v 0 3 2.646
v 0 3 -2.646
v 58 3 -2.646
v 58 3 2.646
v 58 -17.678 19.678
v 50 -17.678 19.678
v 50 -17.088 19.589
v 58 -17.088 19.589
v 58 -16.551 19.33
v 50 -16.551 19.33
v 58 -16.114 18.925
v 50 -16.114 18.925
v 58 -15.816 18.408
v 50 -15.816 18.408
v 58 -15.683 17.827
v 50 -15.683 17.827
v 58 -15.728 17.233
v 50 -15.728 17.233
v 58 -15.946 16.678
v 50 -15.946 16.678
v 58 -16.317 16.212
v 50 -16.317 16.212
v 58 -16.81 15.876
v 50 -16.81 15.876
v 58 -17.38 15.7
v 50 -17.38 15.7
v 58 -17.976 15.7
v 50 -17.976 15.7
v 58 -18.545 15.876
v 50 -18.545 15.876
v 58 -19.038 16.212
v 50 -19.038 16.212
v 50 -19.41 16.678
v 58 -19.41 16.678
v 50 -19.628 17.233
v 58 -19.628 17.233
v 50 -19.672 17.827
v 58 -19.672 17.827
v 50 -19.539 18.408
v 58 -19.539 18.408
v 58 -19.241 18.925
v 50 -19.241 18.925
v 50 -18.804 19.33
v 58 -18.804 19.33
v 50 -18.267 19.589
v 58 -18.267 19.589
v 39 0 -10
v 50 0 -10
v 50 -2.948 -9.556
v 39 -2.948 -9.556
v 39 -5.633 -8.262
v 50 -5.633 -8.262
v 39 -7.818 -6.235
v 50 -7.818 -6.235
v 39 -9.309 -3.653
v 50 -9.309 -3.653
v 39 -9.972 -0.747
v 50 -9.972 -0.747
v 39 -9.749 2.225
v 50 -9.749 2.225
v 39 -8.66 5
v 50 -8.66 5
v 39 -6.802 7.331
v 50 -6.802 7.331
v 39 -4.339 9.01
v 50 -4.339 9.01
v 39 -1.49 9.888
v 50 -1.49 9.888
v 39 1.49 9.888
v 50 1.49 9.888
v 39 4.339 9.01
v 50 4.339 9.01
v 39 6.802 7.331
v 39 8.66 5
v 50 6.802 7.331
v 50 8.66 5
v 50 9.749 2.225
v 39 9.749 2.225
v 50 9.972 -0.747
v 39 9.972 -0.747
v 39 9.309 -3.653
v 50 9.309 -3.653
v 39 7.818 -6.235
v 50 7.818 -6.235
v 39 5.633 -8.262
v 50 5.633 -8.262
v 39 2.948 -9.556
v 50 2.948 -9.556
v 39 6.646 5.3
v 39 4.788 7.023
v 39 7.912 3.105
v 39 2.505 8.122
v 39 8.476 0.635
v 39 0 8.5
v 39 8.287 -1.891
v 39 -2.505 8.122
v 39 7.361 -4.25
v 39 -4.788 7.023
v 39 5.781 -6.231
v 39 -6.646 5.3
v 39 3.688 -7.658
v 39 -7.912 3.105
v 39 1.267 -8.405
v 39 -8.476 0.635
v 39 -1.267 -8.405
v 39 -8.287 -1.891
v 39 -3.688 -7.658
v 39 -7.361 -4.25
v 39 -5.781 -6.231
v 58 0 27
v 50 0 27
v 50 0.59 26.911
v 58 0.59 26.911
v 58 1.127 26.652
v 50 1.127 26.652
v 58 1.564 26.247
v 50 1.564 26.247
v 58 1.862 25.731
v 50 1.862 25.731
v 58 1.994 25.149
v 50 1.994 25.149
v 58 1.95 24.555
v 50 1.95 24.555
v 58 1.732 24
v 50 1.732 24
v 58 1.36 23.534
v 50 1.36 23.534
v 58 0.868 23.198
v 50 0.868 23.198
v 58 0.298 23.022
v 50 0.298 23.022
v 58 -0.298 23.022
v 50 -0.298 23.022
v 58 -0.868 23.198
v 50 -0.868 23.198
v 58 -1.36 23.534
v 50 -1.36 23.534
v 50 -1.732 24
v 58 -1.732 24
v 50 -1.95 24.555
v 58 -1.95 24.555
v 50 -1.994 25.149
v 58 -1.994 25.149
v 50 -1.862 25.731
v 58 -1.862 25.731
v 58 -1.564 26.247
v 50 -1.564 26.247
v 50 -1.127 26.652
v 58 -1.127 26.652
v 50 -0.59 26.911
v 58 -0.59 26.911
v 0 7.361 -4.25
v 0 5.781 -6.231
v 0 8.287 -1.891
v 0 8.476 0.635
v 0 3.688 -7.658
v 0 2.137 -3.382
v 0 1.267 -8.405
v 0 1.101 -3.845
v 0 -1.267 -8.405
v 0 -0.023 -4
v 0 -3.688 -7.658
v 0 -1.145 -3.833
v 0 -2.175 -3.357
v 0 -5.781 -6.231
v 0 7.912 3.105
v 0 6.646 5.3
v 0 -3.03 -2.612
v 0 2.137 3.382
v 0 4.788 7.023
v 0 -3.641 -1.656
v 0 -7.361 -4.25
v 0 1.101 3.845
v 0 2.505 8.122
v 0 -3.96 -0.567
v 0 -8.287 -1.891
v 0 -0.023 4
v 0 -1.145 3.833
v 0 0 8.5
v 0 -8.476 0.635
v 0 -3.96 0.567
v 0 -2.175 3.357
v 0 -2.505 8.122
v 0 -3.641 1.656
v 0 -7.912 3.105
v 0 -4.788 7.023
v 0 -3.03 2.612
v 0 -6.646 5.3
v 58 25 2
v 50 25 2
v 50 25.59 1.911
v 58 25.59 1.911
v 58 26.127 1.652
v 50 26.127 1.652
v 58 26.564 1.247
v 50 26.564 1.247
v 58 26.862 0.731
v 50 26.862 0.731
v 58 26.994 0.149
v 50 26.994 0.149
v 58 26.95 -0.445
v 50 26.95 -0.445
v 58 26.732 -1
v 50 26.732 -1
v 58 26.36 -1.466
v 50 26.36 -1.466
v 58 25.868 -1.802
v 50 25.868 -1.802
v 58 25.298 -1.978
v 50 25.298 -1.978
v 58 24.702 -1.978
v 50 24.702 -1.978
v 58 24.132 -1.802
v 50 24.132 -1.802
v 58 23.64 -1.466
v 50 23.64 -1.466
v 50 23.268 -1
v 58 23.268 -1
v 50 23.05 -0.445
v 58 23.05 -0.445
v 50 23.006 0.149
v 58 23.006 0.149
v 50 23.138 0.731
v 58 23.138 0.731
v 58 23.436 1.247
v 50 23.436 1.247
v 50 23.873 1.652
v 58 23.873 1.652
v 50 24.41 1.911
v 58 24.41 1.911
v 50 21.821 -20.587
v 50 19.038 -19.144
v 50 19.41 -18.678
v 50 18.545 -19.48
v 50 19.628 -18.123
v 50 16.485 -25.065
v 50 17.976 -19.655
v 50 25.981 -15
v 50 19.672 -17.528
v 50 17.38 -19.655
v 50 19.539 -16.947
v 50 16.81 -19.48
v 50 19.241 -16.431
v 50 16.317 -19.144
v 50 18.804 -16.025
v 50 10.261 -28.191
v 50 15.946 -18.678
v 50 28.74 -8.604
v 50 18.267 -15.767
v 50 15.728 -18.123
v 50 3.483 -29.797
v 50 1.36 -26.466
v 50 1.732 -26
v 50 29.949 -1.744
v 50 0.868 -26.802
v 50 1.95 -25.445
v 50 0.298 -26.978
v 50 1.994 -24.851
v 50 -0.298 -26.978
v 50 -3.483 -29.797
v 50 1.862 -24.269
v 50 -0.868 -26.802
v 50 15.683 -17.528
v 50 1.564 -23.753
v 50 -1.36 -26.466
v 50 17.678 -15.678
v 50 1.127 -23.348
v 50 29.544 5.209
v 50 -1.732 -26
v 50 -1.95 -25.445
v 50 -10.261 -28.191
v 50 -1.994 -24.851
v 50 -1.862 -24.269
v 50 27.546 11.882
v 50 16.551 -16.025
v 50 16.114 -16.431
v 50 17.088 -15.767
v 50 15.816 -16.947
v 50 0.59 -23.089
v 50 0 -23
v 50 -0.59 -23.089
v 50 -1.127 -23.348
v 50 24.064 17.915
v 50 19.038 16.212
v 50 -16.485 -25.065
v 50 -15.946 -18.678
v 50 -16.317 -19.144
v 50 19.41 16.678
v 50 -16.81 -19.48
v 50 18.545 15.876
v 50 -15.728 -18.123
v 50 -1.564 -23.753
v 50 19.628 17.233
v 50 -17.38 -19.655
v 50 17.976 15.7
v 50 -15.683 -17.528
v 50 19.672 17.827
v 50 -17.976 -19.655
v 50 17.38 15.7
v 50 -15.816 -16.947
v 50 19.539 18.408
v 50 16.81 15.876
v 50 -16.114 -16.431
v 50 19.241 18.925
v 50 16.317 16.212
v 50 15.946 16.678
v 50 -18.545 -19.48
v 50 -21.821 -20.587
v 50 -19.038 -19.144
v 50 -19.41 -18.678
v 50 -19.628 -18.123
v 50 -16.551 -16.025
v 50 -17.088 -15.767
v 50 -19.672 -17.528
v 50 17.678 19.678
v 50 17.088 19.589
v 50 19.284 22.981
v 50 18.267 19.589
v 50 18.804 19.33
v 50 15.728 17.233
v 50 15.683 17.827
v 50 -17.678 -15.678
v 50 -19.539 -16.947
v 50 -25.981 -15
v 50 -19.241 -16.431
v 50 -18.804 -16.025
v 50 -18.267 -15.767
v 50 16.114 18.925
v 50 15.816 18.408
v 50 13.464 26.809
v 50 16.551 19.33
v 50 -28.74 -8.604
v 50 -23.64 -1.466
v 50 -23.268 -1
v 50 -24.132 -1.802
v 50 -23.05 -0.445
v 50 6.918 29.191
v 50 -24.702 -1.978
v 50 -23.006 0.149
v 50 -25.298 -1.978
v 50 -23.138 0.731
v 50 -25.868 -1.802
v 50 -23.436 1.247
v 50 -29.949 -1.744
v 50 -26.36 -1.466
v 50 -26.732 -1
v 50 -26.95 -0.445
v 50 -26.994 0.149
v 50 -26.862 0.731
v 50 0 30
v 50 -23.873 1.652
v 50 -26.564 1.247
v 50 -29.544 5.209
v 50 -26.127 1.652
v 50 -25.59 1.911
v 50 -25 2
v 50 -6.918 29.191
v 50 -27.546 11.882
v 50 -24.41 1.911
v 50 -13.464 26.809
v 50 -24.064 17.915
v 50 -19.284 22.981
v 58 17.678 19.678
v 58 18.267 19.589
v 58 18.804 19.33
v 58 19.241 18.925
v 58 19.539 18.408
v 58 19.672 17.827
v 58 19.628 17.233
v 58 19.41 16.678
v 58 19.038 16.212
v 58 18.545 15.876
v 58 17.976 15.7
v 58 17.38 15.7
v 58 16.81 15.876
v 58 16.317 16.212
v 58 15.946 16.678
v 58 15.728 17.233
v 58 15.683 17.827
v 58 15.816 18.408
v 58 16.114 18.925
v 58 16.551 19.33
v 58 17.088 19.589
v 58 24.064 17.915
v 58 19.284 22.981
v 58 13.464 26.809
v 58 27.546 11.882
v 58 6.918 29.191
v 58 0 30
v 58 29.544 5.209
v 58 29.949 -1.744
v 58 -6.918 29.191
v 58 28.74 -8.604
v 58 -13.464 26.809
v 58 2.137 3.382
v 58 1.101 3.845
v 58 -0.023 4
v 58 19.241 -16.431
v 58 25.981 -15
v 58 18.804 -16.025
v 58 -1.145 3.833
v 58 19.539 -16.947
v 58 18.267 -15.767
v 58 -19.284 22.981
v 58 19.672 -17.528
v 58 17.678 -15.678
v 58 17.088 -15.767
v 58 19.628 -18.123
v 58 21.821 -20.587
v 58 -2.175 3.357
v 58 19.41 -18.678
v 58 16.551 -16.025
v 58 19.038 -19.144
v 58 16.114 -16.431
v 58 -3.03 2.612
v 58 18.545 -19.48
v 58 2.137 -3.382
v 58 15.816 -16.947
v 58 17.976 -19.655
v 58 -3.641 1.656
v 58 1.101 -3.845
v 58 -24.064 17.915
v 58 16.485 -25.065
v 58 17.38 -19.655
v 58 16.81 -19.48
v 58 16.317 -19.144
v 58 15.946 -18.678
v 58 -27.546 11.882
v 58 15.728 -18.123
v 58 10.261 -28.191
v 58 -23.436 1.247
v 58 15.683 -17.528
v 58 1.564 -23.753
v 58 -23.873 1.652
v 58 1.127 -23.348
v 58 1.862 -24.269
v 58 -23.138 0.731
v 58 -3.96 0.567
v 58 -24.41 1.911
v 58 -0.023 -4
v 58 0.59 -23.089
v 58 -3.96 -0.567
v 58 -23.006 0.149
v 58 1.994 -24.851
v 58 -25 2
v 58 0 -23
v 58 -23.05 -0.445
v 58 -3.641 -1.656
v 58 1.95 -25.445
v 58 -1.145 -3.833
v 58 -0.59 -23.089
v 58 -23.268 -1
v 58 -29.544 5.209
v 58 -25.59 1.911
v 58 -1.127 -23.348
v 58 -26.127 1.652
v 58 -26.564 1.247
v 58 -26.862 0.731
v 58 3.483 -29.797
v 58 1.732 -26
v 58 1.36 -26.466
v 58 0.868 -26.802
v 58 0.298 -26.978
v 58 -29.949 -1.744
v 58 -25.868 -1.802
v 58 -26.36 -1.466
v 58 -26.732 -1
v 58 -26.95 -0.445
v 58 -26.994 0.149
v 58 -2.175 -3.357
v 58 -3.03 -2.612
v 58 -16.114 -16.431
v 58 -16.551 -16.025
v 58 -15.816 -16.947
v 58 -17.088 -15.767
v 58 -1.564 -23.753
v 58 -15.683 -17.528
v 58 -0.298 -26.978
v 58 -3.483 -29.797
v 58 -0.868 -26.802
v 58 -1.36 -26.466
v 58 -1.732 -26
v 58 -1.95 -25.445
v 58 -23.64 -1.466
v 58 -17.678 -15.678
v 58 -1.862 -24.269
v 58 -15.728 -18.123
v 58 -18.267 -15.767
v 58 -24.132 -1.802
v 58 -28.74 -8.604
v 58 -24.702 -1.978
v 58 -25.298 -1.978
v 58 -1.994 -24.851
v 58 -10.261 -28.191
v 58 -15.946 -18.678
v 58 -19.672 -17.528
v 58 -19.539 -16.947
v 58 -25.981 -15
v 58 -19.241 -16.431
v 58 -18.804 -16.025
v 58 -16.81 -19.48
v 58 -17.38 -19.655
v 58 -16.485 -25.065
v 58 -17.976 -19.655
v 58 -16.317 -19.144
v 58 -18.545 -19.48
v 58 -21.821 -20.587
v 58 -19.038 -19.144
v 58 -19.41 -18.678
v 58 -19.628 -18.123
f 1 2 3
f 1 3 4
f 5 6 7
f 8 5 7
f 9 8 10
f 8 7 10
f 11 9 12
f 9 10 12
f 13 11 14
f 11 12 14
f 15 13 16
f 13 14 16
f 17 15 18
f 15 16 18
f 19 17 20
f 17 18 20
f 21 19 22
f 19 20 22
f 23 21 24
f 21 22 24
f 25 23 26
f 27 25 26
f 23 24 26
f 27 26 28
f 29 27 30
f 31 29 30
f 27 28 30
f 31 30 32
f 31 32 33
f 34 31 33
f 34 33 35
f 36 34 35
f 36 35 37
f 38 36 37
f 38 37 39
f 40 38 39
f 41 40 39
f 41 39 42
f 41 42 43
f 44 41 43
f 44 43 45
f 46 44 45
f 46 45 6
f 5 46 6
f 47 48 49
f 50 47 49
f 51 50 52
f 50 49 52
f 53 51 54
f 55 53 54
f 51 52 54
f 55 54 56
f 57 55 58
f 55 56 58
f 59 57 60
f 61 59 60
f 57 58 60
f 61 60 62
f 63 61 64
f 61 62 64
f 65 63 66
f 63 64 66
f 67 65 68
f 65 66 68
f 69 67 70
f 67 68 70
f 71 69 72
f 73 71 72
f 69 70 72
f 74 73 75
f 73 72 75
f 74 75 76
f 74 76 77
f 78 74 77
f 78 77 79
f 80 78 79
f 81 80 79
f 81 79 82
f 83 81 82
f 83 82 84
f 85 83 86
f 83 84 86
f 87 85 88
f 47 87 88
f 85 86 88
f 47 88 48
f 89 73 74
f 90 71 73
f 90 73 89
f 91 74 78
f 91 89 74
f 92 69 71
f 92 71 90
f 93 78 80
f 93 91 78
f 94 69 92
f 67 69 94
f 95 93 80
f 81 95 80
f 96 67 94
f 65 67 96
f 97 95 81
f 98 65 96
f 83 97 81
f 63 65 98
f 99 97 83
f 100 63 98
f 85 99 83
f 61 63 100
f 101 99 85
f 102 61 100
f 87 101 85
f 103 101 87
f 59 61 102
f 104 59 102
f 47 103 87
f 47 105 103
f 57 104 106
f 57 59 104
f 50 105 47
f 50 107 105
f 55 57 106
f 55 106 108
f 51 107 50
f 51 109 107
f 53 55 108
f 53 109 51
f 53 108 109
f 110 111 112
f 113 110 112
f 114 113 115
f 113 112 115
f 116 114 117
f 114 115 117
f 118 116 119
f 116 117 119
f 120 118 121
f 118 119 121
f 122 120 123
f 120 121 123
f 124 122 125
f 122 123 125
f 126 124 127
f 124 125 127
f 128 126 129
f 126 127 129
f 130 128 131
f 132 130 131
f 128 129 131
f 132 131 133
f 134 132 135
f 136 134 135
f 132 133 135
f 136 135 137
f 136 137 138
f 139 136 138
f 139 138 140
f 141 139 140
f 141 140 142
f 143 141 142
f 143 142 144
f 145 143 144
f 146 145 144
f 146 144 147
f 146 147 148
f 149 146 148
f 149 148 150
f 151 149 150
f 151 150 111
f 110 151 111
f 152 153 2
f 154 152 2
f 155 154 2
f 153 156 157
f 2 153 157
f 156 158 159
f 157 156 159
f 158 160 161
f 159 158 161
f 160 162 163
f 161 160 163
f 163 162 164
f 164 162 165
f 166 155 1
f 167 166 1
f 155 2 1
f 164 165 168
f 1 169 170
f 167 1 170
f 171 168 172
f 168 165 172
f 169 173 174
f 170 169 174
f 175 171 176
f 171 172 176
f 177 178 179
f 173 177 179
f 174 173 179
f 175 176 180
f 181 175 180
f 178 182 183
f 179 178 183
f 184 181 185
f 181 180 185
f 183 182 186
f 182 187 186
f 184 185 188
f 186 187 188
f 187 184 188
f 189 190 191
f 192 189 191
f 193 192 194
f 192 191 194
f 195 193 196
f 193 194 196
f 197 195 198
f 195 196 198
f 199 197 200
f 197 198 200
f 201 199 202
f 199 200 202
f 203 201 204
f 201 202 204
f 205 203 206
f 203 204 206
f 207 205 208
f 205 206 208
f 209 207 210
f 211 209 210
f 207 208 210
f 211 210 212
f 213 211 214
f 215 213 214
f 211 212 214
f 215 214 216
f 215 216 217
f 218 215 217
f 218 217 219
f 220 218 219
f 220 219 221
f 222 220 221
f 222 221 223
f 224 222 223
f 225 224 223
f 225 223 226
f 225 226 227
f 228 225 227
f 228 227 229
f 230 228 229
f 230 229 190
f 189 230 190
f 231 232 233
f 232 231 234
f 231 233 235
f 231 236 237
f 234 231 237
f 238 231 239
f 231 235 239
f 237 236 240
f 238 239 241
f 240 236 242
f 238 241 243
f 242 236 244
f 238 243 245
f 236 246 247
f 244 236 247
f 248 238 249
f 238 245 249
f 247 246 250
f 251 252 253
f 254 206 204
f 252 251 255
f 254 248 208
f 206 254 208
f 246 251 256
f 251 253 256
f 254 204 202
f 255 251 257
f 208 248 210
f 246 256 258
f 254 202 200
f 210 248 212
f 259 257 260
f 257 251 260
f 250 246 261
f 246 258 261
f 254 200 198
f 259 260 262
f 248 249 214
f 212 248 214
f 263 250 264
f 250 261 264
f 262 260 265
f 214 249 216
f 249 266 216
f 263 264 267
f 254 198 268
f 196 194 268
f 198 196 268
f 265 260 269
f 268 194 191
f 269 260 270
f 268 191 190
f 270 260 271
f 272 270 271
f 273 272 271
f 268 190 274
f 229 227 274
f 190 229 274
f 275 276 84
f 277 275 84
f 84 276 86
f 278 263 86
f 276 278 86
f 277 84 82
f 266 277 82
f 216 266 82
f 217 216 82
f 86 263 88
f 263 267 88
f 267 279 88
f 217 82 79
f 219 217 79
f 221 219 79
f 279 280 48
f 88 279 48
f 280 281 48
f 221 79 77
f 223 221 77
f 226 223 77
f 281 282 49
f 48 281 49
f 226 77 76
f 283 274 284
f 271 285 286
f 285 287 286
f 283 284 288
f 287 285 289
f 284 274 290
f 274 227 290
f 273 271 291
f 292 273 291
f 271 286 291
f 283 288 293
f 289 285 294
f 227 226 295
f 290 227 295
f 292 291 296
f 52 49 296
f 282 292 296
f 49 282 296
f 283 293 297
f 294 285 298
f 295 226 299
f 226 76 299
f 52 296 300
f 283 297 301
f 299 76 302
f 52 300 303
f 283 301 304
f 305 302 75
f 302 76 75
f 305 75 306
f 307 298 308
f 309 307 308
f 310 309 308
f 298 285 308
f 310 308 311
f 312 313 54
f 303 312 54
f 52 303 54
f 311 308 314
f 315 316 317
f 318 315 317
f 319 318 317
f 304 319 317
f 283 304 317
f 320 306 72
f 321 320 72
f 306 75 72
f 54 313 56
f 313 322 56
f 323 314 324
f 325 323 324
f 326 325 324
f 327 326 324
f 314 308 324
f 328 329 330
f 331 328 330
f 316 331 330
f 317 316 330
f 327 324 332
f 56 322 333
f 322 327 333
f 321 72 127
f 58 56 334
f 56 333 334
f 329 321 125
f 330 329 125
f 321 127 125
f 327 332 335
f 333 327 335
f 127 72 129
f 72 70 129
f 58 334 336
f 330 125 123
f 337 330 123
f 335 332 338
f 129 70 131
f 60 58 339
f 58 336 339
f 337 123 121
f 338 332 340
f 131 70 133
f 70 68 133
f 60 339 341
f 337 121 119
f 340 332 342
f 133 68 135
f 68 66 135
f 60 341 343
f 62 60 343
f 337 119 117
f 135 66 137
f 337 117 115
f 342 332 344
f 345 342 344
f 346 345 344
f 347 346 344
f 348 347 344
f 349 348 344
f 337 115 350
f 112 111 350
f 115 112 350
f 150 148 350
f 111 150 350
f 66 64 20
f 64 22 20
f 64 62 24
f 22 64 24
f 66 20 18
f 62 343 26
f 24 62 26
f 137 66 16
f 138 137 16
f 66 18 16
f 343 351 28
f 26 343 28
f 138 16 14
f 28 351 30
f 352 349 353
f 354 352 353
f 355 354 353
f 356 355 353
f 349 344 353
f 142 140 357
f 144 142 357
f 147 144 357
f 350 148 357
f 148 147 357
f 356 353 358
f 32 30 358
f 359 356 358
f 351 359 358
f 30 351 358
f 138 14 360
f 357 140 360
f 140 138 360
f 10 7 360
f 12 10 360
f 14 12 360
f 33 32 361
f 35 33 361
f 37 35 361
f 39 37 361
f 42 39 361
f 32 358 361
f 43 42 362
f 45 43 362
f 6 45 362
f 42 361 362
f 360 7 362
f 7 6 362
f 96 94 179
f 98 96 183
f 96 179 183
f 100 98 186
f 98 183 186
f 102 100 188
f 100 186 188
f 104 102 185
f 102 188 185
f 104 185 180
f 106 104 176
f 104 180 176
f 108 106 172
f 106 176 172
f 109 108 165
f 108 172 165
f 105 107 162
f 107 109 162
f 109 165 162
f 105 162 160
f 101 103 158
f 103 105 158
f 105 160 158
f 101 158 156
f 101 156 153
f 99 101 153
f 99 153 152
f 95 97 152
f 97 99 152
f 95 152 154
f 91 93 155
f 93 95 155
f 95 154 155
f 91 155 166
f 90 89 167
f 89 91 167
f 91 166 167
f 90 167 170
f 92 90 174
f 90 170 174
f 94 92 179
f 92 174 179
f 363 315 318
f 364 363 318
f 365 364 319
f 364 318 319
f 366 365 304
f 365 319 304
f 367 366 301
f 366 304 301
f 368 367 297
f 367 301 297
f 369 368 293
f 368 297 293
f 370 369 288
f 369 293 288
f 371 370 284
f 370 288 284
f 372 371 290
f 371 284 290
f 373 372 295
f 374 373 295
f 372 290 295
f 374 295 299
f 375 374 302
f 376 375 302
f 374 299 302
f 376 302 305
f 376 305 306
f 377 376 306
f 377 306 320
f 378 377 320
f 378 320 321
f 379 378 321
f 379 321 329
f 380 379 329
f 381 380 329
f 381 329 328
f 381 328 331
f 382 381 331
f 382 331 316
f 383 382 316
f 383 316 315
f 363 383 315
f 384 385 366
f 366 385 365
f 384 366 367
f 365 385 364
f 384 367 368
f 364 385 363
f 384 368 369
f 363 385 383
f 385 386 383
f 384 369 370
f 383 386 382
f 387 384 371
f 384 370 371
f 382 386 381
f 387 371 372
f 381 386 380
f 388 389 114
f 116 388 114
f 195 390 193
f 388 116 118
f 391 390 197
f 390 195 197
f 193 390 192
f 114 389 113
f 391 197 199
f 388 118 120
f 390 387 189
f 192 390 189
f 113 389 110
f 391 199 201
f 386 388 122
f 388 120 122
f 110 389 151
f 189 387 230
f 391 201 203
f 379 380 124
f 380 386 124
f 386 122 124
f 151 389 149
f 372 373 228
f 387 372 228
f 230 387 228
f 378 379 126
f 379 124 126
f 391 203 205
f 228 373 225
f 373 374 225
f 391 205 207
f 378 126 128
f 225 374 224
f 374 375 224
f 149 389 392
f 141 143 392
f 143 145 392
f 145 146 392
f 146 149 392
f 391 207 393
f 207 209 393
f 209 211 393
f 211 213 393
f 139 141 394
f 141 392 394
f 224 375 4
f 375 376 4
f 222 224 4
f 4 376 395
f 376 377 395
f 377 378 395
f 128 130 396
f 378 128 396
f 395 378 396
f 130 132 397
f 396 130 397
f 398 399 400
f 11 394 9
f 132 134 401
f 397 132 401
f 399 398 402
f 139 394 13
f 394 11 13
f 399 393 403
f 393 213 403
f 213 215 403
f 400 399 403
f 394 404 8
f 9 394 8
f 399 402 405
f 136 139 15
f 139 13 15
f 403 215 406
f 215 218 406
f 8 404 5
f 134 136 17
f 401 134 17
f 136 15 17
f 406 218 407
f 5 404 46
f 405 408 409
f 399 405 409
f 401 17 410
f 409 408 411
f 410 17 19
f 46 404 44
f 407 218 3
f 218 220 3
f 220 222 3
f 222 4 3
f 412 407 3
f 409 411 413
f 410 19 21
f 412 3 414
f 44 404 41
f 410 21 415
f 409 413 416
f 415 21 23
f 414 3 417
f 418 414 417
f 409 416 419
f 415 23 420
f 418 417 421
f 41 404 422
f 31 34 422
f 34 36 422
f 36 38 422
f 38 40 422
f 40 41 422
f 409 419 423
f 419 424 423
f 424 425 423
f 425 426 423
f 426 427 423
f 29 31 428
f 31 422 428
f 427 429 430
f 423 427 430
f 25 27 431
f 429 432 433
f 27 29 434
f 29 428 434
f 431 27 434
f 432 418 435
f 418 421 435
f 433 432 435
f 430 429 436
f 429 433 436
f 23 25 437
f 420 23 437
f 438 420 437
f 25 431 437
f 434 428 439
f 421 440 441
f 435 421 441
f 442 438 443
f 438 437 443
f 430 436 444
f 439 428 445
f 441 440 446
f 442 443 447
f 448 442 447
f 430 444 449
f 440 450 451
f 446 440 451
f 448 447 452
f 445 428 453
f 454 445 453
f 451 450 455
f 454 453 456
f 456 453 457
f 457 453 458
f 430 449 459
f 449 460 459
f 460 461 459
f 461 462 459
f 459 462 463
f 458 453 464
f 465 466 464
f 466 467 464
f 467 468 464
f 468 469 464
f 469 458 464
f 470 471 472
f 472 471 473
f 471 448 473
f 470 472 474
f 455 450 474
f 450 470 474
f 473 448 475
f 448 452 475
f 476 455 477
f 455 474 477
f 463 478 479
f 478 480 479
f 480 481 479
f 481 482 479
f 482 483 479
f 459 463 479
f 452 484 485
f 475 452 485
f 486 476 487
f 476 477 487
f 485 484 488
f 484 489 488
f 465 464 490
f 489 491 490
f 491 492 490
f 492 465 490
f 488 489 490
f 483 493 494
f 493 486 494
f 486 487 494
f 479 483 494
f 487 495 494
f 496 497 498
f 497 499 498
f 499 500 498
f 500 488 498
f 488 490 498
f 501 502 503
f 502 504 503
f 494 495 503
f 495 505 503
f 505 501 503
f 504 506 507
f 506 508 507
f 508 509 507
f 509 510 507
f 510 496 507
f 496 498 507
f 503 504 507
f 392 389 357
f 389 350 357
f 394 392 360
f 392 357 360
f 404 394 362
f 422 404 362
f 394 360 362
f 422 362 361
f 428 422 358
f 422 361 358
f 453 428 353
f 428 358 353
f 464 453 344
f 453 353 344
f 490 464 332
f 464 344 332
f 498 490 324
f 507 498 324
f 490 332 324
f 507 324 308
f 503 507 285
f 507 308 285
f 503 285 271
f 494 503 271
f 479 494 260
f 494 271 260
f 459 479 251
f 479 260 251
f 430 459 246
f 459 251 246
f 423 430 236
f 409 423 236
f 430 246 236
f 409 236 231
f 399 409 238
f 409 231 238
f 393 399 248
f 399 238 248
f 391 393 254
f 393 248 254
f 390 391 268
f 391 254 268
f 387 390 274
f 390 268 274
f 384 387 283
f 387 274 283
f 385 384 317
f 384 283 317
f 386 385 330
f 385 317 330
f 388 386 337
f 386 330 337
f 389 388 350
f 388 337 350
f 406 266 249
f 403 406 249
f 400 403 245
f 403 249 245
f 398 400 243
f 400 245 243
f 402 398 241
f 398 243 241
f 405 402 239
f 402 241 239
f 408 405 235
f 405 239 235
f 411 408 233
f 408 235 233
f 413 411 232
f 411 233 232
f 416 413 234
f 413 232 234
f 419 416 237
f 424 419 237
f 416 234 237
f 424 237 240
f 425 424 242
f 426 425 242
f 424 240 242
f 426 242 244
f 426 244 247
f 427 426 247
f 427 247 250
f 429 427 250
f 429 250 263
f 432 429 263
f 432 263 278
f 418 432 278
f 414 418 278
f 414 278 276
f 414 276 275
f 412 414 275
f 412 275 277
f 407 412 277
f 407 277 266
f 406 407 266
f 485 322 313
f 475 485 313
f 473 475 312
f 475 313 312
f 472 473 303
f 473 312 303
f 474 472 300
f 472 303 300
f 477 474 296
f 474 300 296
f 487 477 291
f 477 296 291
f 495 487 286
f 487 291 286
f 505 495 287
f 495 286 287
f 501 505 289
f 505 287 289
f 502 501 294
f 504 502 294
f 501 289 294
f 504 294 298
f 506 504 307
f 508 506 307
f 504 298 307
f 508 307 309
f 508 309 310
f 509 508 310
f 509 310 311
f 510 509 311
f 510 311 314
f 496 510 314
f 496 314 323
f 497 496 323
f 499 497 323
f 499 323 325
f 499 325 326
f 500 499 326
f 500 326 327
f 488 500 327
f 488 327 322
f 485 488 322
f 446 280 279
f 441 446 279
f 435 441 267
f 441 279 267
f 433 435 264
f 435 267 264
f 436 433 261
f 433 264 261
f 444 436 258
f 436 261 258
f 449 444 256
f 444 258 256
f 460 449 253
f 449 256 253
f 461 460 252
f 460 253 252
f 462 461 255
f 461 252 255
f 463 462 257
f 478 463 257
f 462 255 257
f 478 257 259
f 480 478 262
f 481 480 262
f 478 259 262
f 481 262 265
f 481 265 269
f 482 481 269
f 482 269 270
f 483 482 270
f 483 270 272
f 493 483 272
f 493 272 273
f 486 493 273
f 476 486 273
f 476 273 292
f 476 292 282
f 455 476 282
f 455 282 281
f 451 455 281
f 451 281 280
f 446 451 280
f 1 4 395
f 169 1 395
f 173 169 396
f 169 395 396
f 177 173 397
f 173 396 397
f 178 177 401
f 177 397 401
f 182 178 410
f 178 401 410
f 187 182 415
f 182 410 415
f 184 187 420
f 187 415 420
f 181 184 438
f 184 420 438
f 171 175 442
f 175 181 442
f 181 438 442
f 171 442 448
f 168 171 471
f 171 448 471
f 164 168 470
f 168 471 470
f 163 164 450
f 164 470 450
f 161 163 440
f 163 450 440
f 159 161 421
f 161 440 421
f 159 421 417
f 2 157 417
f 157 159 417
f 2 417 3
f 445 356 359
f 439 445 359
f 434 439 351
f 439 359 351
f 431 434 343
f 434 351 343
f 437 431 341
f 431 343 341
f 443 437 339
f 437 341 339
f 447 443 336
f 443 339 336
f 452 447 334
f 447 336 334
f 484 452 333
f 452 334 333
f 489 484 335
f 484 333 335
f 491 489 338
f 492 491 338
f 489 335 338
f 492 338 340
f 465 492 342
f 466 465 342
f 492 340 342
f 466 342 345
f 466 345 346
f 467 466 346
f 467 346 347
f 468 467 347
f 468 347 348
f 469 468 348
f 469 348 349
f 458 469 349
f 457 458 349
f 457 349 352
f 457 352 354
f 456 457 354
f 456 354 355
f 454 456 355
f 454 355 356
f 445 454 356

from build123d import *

# Parameters (mm, degrees)
SKETCH2_R           = 2
CUT_EXTRUDE1_DEPTH  = 10
BOSS_EXTRUDE1_DEPTH = 58
SKETCH4_R           = 10
BOSS_EXTRUDE2_DEPTH = 11


with BuildPart() as part:
    # Sketch1 → Revolve1 (revolve)
    with BuildSketch(Plane.XY, mode=Mode.PRIVATE) as revolve1_sk:
        Polygon((0, 4), (58, 4), (58, 30), (50, 30), (50, 8.5), (0, 8.5), align=None)
    revolve(revolve1_sk.sketch.rotate(Axis((0, 0, 0), (1, 0, 0)), 90), axis=Axis((0, 0, 0), (1, 0, 0)))

    # Sketch2 → Cut-Extrude1 (cut)
    with BuildSketch(Plane.ZY.offset(-50)):
        with Locations((0, 25)):
            Circle(SKETCH2_R)
        with Locations((17.67766953, 17.67766953)):
            Circle(SKETCH2_R)
        with Locations((25, 0)):
            Circle(SKETCH2_R)
        with Locations((17.67766953, -17.67766953)):
            Circle(SKETCH2_R)
        with Locations((0, -25)):
            Circle(SKETCH2_R)
        with Locations((-17.67766953, -17.67766953)):
            Circle(SKETCH2_R)
        with Locations((-25, 0)):
            Circle(SKETCH2_R)
        with Locations((-17.67766953, 17.67766953)):
            Circle(SKETCH2_R)
    extrude(amount=-CUT_EXTRUDE1_DEPTH, mode=Mode.SUBTRACT)

    # Sketch3 → Boss-Extrude1 (add, through all)
    with BuildSketch(Plane.ZY):
        with BuildLine():
            Line((-2.645751311, 3), (2.645751311, 3))
            ThreePointArc((2.645751311, 3), (0, 4), (-2.645751311, 3))
        make_face()
    extrude(amount=-BOSS_EXTRUDE1_DEPTH)

    # Sketch4 → Boss-Extrude2 (add)
    with BuildSketch(Plane.ZY.offset(-50)):
        with Locations(Location((0, 0, 0), (0, 0, 180))):
            Circle(SKETCH4_R)
        with BuildLine():
            Line((-2.645751311, 3), (2.645751311, 3))
            ThreePointArc((2.645751311, 3), (0, -4), (-2.645751311, 3))
        make_face(mode=Mode.SUBTRACT)
    extrude(amount=BOSS_EXTRUDE2_DEPTH)


solid = part.part
